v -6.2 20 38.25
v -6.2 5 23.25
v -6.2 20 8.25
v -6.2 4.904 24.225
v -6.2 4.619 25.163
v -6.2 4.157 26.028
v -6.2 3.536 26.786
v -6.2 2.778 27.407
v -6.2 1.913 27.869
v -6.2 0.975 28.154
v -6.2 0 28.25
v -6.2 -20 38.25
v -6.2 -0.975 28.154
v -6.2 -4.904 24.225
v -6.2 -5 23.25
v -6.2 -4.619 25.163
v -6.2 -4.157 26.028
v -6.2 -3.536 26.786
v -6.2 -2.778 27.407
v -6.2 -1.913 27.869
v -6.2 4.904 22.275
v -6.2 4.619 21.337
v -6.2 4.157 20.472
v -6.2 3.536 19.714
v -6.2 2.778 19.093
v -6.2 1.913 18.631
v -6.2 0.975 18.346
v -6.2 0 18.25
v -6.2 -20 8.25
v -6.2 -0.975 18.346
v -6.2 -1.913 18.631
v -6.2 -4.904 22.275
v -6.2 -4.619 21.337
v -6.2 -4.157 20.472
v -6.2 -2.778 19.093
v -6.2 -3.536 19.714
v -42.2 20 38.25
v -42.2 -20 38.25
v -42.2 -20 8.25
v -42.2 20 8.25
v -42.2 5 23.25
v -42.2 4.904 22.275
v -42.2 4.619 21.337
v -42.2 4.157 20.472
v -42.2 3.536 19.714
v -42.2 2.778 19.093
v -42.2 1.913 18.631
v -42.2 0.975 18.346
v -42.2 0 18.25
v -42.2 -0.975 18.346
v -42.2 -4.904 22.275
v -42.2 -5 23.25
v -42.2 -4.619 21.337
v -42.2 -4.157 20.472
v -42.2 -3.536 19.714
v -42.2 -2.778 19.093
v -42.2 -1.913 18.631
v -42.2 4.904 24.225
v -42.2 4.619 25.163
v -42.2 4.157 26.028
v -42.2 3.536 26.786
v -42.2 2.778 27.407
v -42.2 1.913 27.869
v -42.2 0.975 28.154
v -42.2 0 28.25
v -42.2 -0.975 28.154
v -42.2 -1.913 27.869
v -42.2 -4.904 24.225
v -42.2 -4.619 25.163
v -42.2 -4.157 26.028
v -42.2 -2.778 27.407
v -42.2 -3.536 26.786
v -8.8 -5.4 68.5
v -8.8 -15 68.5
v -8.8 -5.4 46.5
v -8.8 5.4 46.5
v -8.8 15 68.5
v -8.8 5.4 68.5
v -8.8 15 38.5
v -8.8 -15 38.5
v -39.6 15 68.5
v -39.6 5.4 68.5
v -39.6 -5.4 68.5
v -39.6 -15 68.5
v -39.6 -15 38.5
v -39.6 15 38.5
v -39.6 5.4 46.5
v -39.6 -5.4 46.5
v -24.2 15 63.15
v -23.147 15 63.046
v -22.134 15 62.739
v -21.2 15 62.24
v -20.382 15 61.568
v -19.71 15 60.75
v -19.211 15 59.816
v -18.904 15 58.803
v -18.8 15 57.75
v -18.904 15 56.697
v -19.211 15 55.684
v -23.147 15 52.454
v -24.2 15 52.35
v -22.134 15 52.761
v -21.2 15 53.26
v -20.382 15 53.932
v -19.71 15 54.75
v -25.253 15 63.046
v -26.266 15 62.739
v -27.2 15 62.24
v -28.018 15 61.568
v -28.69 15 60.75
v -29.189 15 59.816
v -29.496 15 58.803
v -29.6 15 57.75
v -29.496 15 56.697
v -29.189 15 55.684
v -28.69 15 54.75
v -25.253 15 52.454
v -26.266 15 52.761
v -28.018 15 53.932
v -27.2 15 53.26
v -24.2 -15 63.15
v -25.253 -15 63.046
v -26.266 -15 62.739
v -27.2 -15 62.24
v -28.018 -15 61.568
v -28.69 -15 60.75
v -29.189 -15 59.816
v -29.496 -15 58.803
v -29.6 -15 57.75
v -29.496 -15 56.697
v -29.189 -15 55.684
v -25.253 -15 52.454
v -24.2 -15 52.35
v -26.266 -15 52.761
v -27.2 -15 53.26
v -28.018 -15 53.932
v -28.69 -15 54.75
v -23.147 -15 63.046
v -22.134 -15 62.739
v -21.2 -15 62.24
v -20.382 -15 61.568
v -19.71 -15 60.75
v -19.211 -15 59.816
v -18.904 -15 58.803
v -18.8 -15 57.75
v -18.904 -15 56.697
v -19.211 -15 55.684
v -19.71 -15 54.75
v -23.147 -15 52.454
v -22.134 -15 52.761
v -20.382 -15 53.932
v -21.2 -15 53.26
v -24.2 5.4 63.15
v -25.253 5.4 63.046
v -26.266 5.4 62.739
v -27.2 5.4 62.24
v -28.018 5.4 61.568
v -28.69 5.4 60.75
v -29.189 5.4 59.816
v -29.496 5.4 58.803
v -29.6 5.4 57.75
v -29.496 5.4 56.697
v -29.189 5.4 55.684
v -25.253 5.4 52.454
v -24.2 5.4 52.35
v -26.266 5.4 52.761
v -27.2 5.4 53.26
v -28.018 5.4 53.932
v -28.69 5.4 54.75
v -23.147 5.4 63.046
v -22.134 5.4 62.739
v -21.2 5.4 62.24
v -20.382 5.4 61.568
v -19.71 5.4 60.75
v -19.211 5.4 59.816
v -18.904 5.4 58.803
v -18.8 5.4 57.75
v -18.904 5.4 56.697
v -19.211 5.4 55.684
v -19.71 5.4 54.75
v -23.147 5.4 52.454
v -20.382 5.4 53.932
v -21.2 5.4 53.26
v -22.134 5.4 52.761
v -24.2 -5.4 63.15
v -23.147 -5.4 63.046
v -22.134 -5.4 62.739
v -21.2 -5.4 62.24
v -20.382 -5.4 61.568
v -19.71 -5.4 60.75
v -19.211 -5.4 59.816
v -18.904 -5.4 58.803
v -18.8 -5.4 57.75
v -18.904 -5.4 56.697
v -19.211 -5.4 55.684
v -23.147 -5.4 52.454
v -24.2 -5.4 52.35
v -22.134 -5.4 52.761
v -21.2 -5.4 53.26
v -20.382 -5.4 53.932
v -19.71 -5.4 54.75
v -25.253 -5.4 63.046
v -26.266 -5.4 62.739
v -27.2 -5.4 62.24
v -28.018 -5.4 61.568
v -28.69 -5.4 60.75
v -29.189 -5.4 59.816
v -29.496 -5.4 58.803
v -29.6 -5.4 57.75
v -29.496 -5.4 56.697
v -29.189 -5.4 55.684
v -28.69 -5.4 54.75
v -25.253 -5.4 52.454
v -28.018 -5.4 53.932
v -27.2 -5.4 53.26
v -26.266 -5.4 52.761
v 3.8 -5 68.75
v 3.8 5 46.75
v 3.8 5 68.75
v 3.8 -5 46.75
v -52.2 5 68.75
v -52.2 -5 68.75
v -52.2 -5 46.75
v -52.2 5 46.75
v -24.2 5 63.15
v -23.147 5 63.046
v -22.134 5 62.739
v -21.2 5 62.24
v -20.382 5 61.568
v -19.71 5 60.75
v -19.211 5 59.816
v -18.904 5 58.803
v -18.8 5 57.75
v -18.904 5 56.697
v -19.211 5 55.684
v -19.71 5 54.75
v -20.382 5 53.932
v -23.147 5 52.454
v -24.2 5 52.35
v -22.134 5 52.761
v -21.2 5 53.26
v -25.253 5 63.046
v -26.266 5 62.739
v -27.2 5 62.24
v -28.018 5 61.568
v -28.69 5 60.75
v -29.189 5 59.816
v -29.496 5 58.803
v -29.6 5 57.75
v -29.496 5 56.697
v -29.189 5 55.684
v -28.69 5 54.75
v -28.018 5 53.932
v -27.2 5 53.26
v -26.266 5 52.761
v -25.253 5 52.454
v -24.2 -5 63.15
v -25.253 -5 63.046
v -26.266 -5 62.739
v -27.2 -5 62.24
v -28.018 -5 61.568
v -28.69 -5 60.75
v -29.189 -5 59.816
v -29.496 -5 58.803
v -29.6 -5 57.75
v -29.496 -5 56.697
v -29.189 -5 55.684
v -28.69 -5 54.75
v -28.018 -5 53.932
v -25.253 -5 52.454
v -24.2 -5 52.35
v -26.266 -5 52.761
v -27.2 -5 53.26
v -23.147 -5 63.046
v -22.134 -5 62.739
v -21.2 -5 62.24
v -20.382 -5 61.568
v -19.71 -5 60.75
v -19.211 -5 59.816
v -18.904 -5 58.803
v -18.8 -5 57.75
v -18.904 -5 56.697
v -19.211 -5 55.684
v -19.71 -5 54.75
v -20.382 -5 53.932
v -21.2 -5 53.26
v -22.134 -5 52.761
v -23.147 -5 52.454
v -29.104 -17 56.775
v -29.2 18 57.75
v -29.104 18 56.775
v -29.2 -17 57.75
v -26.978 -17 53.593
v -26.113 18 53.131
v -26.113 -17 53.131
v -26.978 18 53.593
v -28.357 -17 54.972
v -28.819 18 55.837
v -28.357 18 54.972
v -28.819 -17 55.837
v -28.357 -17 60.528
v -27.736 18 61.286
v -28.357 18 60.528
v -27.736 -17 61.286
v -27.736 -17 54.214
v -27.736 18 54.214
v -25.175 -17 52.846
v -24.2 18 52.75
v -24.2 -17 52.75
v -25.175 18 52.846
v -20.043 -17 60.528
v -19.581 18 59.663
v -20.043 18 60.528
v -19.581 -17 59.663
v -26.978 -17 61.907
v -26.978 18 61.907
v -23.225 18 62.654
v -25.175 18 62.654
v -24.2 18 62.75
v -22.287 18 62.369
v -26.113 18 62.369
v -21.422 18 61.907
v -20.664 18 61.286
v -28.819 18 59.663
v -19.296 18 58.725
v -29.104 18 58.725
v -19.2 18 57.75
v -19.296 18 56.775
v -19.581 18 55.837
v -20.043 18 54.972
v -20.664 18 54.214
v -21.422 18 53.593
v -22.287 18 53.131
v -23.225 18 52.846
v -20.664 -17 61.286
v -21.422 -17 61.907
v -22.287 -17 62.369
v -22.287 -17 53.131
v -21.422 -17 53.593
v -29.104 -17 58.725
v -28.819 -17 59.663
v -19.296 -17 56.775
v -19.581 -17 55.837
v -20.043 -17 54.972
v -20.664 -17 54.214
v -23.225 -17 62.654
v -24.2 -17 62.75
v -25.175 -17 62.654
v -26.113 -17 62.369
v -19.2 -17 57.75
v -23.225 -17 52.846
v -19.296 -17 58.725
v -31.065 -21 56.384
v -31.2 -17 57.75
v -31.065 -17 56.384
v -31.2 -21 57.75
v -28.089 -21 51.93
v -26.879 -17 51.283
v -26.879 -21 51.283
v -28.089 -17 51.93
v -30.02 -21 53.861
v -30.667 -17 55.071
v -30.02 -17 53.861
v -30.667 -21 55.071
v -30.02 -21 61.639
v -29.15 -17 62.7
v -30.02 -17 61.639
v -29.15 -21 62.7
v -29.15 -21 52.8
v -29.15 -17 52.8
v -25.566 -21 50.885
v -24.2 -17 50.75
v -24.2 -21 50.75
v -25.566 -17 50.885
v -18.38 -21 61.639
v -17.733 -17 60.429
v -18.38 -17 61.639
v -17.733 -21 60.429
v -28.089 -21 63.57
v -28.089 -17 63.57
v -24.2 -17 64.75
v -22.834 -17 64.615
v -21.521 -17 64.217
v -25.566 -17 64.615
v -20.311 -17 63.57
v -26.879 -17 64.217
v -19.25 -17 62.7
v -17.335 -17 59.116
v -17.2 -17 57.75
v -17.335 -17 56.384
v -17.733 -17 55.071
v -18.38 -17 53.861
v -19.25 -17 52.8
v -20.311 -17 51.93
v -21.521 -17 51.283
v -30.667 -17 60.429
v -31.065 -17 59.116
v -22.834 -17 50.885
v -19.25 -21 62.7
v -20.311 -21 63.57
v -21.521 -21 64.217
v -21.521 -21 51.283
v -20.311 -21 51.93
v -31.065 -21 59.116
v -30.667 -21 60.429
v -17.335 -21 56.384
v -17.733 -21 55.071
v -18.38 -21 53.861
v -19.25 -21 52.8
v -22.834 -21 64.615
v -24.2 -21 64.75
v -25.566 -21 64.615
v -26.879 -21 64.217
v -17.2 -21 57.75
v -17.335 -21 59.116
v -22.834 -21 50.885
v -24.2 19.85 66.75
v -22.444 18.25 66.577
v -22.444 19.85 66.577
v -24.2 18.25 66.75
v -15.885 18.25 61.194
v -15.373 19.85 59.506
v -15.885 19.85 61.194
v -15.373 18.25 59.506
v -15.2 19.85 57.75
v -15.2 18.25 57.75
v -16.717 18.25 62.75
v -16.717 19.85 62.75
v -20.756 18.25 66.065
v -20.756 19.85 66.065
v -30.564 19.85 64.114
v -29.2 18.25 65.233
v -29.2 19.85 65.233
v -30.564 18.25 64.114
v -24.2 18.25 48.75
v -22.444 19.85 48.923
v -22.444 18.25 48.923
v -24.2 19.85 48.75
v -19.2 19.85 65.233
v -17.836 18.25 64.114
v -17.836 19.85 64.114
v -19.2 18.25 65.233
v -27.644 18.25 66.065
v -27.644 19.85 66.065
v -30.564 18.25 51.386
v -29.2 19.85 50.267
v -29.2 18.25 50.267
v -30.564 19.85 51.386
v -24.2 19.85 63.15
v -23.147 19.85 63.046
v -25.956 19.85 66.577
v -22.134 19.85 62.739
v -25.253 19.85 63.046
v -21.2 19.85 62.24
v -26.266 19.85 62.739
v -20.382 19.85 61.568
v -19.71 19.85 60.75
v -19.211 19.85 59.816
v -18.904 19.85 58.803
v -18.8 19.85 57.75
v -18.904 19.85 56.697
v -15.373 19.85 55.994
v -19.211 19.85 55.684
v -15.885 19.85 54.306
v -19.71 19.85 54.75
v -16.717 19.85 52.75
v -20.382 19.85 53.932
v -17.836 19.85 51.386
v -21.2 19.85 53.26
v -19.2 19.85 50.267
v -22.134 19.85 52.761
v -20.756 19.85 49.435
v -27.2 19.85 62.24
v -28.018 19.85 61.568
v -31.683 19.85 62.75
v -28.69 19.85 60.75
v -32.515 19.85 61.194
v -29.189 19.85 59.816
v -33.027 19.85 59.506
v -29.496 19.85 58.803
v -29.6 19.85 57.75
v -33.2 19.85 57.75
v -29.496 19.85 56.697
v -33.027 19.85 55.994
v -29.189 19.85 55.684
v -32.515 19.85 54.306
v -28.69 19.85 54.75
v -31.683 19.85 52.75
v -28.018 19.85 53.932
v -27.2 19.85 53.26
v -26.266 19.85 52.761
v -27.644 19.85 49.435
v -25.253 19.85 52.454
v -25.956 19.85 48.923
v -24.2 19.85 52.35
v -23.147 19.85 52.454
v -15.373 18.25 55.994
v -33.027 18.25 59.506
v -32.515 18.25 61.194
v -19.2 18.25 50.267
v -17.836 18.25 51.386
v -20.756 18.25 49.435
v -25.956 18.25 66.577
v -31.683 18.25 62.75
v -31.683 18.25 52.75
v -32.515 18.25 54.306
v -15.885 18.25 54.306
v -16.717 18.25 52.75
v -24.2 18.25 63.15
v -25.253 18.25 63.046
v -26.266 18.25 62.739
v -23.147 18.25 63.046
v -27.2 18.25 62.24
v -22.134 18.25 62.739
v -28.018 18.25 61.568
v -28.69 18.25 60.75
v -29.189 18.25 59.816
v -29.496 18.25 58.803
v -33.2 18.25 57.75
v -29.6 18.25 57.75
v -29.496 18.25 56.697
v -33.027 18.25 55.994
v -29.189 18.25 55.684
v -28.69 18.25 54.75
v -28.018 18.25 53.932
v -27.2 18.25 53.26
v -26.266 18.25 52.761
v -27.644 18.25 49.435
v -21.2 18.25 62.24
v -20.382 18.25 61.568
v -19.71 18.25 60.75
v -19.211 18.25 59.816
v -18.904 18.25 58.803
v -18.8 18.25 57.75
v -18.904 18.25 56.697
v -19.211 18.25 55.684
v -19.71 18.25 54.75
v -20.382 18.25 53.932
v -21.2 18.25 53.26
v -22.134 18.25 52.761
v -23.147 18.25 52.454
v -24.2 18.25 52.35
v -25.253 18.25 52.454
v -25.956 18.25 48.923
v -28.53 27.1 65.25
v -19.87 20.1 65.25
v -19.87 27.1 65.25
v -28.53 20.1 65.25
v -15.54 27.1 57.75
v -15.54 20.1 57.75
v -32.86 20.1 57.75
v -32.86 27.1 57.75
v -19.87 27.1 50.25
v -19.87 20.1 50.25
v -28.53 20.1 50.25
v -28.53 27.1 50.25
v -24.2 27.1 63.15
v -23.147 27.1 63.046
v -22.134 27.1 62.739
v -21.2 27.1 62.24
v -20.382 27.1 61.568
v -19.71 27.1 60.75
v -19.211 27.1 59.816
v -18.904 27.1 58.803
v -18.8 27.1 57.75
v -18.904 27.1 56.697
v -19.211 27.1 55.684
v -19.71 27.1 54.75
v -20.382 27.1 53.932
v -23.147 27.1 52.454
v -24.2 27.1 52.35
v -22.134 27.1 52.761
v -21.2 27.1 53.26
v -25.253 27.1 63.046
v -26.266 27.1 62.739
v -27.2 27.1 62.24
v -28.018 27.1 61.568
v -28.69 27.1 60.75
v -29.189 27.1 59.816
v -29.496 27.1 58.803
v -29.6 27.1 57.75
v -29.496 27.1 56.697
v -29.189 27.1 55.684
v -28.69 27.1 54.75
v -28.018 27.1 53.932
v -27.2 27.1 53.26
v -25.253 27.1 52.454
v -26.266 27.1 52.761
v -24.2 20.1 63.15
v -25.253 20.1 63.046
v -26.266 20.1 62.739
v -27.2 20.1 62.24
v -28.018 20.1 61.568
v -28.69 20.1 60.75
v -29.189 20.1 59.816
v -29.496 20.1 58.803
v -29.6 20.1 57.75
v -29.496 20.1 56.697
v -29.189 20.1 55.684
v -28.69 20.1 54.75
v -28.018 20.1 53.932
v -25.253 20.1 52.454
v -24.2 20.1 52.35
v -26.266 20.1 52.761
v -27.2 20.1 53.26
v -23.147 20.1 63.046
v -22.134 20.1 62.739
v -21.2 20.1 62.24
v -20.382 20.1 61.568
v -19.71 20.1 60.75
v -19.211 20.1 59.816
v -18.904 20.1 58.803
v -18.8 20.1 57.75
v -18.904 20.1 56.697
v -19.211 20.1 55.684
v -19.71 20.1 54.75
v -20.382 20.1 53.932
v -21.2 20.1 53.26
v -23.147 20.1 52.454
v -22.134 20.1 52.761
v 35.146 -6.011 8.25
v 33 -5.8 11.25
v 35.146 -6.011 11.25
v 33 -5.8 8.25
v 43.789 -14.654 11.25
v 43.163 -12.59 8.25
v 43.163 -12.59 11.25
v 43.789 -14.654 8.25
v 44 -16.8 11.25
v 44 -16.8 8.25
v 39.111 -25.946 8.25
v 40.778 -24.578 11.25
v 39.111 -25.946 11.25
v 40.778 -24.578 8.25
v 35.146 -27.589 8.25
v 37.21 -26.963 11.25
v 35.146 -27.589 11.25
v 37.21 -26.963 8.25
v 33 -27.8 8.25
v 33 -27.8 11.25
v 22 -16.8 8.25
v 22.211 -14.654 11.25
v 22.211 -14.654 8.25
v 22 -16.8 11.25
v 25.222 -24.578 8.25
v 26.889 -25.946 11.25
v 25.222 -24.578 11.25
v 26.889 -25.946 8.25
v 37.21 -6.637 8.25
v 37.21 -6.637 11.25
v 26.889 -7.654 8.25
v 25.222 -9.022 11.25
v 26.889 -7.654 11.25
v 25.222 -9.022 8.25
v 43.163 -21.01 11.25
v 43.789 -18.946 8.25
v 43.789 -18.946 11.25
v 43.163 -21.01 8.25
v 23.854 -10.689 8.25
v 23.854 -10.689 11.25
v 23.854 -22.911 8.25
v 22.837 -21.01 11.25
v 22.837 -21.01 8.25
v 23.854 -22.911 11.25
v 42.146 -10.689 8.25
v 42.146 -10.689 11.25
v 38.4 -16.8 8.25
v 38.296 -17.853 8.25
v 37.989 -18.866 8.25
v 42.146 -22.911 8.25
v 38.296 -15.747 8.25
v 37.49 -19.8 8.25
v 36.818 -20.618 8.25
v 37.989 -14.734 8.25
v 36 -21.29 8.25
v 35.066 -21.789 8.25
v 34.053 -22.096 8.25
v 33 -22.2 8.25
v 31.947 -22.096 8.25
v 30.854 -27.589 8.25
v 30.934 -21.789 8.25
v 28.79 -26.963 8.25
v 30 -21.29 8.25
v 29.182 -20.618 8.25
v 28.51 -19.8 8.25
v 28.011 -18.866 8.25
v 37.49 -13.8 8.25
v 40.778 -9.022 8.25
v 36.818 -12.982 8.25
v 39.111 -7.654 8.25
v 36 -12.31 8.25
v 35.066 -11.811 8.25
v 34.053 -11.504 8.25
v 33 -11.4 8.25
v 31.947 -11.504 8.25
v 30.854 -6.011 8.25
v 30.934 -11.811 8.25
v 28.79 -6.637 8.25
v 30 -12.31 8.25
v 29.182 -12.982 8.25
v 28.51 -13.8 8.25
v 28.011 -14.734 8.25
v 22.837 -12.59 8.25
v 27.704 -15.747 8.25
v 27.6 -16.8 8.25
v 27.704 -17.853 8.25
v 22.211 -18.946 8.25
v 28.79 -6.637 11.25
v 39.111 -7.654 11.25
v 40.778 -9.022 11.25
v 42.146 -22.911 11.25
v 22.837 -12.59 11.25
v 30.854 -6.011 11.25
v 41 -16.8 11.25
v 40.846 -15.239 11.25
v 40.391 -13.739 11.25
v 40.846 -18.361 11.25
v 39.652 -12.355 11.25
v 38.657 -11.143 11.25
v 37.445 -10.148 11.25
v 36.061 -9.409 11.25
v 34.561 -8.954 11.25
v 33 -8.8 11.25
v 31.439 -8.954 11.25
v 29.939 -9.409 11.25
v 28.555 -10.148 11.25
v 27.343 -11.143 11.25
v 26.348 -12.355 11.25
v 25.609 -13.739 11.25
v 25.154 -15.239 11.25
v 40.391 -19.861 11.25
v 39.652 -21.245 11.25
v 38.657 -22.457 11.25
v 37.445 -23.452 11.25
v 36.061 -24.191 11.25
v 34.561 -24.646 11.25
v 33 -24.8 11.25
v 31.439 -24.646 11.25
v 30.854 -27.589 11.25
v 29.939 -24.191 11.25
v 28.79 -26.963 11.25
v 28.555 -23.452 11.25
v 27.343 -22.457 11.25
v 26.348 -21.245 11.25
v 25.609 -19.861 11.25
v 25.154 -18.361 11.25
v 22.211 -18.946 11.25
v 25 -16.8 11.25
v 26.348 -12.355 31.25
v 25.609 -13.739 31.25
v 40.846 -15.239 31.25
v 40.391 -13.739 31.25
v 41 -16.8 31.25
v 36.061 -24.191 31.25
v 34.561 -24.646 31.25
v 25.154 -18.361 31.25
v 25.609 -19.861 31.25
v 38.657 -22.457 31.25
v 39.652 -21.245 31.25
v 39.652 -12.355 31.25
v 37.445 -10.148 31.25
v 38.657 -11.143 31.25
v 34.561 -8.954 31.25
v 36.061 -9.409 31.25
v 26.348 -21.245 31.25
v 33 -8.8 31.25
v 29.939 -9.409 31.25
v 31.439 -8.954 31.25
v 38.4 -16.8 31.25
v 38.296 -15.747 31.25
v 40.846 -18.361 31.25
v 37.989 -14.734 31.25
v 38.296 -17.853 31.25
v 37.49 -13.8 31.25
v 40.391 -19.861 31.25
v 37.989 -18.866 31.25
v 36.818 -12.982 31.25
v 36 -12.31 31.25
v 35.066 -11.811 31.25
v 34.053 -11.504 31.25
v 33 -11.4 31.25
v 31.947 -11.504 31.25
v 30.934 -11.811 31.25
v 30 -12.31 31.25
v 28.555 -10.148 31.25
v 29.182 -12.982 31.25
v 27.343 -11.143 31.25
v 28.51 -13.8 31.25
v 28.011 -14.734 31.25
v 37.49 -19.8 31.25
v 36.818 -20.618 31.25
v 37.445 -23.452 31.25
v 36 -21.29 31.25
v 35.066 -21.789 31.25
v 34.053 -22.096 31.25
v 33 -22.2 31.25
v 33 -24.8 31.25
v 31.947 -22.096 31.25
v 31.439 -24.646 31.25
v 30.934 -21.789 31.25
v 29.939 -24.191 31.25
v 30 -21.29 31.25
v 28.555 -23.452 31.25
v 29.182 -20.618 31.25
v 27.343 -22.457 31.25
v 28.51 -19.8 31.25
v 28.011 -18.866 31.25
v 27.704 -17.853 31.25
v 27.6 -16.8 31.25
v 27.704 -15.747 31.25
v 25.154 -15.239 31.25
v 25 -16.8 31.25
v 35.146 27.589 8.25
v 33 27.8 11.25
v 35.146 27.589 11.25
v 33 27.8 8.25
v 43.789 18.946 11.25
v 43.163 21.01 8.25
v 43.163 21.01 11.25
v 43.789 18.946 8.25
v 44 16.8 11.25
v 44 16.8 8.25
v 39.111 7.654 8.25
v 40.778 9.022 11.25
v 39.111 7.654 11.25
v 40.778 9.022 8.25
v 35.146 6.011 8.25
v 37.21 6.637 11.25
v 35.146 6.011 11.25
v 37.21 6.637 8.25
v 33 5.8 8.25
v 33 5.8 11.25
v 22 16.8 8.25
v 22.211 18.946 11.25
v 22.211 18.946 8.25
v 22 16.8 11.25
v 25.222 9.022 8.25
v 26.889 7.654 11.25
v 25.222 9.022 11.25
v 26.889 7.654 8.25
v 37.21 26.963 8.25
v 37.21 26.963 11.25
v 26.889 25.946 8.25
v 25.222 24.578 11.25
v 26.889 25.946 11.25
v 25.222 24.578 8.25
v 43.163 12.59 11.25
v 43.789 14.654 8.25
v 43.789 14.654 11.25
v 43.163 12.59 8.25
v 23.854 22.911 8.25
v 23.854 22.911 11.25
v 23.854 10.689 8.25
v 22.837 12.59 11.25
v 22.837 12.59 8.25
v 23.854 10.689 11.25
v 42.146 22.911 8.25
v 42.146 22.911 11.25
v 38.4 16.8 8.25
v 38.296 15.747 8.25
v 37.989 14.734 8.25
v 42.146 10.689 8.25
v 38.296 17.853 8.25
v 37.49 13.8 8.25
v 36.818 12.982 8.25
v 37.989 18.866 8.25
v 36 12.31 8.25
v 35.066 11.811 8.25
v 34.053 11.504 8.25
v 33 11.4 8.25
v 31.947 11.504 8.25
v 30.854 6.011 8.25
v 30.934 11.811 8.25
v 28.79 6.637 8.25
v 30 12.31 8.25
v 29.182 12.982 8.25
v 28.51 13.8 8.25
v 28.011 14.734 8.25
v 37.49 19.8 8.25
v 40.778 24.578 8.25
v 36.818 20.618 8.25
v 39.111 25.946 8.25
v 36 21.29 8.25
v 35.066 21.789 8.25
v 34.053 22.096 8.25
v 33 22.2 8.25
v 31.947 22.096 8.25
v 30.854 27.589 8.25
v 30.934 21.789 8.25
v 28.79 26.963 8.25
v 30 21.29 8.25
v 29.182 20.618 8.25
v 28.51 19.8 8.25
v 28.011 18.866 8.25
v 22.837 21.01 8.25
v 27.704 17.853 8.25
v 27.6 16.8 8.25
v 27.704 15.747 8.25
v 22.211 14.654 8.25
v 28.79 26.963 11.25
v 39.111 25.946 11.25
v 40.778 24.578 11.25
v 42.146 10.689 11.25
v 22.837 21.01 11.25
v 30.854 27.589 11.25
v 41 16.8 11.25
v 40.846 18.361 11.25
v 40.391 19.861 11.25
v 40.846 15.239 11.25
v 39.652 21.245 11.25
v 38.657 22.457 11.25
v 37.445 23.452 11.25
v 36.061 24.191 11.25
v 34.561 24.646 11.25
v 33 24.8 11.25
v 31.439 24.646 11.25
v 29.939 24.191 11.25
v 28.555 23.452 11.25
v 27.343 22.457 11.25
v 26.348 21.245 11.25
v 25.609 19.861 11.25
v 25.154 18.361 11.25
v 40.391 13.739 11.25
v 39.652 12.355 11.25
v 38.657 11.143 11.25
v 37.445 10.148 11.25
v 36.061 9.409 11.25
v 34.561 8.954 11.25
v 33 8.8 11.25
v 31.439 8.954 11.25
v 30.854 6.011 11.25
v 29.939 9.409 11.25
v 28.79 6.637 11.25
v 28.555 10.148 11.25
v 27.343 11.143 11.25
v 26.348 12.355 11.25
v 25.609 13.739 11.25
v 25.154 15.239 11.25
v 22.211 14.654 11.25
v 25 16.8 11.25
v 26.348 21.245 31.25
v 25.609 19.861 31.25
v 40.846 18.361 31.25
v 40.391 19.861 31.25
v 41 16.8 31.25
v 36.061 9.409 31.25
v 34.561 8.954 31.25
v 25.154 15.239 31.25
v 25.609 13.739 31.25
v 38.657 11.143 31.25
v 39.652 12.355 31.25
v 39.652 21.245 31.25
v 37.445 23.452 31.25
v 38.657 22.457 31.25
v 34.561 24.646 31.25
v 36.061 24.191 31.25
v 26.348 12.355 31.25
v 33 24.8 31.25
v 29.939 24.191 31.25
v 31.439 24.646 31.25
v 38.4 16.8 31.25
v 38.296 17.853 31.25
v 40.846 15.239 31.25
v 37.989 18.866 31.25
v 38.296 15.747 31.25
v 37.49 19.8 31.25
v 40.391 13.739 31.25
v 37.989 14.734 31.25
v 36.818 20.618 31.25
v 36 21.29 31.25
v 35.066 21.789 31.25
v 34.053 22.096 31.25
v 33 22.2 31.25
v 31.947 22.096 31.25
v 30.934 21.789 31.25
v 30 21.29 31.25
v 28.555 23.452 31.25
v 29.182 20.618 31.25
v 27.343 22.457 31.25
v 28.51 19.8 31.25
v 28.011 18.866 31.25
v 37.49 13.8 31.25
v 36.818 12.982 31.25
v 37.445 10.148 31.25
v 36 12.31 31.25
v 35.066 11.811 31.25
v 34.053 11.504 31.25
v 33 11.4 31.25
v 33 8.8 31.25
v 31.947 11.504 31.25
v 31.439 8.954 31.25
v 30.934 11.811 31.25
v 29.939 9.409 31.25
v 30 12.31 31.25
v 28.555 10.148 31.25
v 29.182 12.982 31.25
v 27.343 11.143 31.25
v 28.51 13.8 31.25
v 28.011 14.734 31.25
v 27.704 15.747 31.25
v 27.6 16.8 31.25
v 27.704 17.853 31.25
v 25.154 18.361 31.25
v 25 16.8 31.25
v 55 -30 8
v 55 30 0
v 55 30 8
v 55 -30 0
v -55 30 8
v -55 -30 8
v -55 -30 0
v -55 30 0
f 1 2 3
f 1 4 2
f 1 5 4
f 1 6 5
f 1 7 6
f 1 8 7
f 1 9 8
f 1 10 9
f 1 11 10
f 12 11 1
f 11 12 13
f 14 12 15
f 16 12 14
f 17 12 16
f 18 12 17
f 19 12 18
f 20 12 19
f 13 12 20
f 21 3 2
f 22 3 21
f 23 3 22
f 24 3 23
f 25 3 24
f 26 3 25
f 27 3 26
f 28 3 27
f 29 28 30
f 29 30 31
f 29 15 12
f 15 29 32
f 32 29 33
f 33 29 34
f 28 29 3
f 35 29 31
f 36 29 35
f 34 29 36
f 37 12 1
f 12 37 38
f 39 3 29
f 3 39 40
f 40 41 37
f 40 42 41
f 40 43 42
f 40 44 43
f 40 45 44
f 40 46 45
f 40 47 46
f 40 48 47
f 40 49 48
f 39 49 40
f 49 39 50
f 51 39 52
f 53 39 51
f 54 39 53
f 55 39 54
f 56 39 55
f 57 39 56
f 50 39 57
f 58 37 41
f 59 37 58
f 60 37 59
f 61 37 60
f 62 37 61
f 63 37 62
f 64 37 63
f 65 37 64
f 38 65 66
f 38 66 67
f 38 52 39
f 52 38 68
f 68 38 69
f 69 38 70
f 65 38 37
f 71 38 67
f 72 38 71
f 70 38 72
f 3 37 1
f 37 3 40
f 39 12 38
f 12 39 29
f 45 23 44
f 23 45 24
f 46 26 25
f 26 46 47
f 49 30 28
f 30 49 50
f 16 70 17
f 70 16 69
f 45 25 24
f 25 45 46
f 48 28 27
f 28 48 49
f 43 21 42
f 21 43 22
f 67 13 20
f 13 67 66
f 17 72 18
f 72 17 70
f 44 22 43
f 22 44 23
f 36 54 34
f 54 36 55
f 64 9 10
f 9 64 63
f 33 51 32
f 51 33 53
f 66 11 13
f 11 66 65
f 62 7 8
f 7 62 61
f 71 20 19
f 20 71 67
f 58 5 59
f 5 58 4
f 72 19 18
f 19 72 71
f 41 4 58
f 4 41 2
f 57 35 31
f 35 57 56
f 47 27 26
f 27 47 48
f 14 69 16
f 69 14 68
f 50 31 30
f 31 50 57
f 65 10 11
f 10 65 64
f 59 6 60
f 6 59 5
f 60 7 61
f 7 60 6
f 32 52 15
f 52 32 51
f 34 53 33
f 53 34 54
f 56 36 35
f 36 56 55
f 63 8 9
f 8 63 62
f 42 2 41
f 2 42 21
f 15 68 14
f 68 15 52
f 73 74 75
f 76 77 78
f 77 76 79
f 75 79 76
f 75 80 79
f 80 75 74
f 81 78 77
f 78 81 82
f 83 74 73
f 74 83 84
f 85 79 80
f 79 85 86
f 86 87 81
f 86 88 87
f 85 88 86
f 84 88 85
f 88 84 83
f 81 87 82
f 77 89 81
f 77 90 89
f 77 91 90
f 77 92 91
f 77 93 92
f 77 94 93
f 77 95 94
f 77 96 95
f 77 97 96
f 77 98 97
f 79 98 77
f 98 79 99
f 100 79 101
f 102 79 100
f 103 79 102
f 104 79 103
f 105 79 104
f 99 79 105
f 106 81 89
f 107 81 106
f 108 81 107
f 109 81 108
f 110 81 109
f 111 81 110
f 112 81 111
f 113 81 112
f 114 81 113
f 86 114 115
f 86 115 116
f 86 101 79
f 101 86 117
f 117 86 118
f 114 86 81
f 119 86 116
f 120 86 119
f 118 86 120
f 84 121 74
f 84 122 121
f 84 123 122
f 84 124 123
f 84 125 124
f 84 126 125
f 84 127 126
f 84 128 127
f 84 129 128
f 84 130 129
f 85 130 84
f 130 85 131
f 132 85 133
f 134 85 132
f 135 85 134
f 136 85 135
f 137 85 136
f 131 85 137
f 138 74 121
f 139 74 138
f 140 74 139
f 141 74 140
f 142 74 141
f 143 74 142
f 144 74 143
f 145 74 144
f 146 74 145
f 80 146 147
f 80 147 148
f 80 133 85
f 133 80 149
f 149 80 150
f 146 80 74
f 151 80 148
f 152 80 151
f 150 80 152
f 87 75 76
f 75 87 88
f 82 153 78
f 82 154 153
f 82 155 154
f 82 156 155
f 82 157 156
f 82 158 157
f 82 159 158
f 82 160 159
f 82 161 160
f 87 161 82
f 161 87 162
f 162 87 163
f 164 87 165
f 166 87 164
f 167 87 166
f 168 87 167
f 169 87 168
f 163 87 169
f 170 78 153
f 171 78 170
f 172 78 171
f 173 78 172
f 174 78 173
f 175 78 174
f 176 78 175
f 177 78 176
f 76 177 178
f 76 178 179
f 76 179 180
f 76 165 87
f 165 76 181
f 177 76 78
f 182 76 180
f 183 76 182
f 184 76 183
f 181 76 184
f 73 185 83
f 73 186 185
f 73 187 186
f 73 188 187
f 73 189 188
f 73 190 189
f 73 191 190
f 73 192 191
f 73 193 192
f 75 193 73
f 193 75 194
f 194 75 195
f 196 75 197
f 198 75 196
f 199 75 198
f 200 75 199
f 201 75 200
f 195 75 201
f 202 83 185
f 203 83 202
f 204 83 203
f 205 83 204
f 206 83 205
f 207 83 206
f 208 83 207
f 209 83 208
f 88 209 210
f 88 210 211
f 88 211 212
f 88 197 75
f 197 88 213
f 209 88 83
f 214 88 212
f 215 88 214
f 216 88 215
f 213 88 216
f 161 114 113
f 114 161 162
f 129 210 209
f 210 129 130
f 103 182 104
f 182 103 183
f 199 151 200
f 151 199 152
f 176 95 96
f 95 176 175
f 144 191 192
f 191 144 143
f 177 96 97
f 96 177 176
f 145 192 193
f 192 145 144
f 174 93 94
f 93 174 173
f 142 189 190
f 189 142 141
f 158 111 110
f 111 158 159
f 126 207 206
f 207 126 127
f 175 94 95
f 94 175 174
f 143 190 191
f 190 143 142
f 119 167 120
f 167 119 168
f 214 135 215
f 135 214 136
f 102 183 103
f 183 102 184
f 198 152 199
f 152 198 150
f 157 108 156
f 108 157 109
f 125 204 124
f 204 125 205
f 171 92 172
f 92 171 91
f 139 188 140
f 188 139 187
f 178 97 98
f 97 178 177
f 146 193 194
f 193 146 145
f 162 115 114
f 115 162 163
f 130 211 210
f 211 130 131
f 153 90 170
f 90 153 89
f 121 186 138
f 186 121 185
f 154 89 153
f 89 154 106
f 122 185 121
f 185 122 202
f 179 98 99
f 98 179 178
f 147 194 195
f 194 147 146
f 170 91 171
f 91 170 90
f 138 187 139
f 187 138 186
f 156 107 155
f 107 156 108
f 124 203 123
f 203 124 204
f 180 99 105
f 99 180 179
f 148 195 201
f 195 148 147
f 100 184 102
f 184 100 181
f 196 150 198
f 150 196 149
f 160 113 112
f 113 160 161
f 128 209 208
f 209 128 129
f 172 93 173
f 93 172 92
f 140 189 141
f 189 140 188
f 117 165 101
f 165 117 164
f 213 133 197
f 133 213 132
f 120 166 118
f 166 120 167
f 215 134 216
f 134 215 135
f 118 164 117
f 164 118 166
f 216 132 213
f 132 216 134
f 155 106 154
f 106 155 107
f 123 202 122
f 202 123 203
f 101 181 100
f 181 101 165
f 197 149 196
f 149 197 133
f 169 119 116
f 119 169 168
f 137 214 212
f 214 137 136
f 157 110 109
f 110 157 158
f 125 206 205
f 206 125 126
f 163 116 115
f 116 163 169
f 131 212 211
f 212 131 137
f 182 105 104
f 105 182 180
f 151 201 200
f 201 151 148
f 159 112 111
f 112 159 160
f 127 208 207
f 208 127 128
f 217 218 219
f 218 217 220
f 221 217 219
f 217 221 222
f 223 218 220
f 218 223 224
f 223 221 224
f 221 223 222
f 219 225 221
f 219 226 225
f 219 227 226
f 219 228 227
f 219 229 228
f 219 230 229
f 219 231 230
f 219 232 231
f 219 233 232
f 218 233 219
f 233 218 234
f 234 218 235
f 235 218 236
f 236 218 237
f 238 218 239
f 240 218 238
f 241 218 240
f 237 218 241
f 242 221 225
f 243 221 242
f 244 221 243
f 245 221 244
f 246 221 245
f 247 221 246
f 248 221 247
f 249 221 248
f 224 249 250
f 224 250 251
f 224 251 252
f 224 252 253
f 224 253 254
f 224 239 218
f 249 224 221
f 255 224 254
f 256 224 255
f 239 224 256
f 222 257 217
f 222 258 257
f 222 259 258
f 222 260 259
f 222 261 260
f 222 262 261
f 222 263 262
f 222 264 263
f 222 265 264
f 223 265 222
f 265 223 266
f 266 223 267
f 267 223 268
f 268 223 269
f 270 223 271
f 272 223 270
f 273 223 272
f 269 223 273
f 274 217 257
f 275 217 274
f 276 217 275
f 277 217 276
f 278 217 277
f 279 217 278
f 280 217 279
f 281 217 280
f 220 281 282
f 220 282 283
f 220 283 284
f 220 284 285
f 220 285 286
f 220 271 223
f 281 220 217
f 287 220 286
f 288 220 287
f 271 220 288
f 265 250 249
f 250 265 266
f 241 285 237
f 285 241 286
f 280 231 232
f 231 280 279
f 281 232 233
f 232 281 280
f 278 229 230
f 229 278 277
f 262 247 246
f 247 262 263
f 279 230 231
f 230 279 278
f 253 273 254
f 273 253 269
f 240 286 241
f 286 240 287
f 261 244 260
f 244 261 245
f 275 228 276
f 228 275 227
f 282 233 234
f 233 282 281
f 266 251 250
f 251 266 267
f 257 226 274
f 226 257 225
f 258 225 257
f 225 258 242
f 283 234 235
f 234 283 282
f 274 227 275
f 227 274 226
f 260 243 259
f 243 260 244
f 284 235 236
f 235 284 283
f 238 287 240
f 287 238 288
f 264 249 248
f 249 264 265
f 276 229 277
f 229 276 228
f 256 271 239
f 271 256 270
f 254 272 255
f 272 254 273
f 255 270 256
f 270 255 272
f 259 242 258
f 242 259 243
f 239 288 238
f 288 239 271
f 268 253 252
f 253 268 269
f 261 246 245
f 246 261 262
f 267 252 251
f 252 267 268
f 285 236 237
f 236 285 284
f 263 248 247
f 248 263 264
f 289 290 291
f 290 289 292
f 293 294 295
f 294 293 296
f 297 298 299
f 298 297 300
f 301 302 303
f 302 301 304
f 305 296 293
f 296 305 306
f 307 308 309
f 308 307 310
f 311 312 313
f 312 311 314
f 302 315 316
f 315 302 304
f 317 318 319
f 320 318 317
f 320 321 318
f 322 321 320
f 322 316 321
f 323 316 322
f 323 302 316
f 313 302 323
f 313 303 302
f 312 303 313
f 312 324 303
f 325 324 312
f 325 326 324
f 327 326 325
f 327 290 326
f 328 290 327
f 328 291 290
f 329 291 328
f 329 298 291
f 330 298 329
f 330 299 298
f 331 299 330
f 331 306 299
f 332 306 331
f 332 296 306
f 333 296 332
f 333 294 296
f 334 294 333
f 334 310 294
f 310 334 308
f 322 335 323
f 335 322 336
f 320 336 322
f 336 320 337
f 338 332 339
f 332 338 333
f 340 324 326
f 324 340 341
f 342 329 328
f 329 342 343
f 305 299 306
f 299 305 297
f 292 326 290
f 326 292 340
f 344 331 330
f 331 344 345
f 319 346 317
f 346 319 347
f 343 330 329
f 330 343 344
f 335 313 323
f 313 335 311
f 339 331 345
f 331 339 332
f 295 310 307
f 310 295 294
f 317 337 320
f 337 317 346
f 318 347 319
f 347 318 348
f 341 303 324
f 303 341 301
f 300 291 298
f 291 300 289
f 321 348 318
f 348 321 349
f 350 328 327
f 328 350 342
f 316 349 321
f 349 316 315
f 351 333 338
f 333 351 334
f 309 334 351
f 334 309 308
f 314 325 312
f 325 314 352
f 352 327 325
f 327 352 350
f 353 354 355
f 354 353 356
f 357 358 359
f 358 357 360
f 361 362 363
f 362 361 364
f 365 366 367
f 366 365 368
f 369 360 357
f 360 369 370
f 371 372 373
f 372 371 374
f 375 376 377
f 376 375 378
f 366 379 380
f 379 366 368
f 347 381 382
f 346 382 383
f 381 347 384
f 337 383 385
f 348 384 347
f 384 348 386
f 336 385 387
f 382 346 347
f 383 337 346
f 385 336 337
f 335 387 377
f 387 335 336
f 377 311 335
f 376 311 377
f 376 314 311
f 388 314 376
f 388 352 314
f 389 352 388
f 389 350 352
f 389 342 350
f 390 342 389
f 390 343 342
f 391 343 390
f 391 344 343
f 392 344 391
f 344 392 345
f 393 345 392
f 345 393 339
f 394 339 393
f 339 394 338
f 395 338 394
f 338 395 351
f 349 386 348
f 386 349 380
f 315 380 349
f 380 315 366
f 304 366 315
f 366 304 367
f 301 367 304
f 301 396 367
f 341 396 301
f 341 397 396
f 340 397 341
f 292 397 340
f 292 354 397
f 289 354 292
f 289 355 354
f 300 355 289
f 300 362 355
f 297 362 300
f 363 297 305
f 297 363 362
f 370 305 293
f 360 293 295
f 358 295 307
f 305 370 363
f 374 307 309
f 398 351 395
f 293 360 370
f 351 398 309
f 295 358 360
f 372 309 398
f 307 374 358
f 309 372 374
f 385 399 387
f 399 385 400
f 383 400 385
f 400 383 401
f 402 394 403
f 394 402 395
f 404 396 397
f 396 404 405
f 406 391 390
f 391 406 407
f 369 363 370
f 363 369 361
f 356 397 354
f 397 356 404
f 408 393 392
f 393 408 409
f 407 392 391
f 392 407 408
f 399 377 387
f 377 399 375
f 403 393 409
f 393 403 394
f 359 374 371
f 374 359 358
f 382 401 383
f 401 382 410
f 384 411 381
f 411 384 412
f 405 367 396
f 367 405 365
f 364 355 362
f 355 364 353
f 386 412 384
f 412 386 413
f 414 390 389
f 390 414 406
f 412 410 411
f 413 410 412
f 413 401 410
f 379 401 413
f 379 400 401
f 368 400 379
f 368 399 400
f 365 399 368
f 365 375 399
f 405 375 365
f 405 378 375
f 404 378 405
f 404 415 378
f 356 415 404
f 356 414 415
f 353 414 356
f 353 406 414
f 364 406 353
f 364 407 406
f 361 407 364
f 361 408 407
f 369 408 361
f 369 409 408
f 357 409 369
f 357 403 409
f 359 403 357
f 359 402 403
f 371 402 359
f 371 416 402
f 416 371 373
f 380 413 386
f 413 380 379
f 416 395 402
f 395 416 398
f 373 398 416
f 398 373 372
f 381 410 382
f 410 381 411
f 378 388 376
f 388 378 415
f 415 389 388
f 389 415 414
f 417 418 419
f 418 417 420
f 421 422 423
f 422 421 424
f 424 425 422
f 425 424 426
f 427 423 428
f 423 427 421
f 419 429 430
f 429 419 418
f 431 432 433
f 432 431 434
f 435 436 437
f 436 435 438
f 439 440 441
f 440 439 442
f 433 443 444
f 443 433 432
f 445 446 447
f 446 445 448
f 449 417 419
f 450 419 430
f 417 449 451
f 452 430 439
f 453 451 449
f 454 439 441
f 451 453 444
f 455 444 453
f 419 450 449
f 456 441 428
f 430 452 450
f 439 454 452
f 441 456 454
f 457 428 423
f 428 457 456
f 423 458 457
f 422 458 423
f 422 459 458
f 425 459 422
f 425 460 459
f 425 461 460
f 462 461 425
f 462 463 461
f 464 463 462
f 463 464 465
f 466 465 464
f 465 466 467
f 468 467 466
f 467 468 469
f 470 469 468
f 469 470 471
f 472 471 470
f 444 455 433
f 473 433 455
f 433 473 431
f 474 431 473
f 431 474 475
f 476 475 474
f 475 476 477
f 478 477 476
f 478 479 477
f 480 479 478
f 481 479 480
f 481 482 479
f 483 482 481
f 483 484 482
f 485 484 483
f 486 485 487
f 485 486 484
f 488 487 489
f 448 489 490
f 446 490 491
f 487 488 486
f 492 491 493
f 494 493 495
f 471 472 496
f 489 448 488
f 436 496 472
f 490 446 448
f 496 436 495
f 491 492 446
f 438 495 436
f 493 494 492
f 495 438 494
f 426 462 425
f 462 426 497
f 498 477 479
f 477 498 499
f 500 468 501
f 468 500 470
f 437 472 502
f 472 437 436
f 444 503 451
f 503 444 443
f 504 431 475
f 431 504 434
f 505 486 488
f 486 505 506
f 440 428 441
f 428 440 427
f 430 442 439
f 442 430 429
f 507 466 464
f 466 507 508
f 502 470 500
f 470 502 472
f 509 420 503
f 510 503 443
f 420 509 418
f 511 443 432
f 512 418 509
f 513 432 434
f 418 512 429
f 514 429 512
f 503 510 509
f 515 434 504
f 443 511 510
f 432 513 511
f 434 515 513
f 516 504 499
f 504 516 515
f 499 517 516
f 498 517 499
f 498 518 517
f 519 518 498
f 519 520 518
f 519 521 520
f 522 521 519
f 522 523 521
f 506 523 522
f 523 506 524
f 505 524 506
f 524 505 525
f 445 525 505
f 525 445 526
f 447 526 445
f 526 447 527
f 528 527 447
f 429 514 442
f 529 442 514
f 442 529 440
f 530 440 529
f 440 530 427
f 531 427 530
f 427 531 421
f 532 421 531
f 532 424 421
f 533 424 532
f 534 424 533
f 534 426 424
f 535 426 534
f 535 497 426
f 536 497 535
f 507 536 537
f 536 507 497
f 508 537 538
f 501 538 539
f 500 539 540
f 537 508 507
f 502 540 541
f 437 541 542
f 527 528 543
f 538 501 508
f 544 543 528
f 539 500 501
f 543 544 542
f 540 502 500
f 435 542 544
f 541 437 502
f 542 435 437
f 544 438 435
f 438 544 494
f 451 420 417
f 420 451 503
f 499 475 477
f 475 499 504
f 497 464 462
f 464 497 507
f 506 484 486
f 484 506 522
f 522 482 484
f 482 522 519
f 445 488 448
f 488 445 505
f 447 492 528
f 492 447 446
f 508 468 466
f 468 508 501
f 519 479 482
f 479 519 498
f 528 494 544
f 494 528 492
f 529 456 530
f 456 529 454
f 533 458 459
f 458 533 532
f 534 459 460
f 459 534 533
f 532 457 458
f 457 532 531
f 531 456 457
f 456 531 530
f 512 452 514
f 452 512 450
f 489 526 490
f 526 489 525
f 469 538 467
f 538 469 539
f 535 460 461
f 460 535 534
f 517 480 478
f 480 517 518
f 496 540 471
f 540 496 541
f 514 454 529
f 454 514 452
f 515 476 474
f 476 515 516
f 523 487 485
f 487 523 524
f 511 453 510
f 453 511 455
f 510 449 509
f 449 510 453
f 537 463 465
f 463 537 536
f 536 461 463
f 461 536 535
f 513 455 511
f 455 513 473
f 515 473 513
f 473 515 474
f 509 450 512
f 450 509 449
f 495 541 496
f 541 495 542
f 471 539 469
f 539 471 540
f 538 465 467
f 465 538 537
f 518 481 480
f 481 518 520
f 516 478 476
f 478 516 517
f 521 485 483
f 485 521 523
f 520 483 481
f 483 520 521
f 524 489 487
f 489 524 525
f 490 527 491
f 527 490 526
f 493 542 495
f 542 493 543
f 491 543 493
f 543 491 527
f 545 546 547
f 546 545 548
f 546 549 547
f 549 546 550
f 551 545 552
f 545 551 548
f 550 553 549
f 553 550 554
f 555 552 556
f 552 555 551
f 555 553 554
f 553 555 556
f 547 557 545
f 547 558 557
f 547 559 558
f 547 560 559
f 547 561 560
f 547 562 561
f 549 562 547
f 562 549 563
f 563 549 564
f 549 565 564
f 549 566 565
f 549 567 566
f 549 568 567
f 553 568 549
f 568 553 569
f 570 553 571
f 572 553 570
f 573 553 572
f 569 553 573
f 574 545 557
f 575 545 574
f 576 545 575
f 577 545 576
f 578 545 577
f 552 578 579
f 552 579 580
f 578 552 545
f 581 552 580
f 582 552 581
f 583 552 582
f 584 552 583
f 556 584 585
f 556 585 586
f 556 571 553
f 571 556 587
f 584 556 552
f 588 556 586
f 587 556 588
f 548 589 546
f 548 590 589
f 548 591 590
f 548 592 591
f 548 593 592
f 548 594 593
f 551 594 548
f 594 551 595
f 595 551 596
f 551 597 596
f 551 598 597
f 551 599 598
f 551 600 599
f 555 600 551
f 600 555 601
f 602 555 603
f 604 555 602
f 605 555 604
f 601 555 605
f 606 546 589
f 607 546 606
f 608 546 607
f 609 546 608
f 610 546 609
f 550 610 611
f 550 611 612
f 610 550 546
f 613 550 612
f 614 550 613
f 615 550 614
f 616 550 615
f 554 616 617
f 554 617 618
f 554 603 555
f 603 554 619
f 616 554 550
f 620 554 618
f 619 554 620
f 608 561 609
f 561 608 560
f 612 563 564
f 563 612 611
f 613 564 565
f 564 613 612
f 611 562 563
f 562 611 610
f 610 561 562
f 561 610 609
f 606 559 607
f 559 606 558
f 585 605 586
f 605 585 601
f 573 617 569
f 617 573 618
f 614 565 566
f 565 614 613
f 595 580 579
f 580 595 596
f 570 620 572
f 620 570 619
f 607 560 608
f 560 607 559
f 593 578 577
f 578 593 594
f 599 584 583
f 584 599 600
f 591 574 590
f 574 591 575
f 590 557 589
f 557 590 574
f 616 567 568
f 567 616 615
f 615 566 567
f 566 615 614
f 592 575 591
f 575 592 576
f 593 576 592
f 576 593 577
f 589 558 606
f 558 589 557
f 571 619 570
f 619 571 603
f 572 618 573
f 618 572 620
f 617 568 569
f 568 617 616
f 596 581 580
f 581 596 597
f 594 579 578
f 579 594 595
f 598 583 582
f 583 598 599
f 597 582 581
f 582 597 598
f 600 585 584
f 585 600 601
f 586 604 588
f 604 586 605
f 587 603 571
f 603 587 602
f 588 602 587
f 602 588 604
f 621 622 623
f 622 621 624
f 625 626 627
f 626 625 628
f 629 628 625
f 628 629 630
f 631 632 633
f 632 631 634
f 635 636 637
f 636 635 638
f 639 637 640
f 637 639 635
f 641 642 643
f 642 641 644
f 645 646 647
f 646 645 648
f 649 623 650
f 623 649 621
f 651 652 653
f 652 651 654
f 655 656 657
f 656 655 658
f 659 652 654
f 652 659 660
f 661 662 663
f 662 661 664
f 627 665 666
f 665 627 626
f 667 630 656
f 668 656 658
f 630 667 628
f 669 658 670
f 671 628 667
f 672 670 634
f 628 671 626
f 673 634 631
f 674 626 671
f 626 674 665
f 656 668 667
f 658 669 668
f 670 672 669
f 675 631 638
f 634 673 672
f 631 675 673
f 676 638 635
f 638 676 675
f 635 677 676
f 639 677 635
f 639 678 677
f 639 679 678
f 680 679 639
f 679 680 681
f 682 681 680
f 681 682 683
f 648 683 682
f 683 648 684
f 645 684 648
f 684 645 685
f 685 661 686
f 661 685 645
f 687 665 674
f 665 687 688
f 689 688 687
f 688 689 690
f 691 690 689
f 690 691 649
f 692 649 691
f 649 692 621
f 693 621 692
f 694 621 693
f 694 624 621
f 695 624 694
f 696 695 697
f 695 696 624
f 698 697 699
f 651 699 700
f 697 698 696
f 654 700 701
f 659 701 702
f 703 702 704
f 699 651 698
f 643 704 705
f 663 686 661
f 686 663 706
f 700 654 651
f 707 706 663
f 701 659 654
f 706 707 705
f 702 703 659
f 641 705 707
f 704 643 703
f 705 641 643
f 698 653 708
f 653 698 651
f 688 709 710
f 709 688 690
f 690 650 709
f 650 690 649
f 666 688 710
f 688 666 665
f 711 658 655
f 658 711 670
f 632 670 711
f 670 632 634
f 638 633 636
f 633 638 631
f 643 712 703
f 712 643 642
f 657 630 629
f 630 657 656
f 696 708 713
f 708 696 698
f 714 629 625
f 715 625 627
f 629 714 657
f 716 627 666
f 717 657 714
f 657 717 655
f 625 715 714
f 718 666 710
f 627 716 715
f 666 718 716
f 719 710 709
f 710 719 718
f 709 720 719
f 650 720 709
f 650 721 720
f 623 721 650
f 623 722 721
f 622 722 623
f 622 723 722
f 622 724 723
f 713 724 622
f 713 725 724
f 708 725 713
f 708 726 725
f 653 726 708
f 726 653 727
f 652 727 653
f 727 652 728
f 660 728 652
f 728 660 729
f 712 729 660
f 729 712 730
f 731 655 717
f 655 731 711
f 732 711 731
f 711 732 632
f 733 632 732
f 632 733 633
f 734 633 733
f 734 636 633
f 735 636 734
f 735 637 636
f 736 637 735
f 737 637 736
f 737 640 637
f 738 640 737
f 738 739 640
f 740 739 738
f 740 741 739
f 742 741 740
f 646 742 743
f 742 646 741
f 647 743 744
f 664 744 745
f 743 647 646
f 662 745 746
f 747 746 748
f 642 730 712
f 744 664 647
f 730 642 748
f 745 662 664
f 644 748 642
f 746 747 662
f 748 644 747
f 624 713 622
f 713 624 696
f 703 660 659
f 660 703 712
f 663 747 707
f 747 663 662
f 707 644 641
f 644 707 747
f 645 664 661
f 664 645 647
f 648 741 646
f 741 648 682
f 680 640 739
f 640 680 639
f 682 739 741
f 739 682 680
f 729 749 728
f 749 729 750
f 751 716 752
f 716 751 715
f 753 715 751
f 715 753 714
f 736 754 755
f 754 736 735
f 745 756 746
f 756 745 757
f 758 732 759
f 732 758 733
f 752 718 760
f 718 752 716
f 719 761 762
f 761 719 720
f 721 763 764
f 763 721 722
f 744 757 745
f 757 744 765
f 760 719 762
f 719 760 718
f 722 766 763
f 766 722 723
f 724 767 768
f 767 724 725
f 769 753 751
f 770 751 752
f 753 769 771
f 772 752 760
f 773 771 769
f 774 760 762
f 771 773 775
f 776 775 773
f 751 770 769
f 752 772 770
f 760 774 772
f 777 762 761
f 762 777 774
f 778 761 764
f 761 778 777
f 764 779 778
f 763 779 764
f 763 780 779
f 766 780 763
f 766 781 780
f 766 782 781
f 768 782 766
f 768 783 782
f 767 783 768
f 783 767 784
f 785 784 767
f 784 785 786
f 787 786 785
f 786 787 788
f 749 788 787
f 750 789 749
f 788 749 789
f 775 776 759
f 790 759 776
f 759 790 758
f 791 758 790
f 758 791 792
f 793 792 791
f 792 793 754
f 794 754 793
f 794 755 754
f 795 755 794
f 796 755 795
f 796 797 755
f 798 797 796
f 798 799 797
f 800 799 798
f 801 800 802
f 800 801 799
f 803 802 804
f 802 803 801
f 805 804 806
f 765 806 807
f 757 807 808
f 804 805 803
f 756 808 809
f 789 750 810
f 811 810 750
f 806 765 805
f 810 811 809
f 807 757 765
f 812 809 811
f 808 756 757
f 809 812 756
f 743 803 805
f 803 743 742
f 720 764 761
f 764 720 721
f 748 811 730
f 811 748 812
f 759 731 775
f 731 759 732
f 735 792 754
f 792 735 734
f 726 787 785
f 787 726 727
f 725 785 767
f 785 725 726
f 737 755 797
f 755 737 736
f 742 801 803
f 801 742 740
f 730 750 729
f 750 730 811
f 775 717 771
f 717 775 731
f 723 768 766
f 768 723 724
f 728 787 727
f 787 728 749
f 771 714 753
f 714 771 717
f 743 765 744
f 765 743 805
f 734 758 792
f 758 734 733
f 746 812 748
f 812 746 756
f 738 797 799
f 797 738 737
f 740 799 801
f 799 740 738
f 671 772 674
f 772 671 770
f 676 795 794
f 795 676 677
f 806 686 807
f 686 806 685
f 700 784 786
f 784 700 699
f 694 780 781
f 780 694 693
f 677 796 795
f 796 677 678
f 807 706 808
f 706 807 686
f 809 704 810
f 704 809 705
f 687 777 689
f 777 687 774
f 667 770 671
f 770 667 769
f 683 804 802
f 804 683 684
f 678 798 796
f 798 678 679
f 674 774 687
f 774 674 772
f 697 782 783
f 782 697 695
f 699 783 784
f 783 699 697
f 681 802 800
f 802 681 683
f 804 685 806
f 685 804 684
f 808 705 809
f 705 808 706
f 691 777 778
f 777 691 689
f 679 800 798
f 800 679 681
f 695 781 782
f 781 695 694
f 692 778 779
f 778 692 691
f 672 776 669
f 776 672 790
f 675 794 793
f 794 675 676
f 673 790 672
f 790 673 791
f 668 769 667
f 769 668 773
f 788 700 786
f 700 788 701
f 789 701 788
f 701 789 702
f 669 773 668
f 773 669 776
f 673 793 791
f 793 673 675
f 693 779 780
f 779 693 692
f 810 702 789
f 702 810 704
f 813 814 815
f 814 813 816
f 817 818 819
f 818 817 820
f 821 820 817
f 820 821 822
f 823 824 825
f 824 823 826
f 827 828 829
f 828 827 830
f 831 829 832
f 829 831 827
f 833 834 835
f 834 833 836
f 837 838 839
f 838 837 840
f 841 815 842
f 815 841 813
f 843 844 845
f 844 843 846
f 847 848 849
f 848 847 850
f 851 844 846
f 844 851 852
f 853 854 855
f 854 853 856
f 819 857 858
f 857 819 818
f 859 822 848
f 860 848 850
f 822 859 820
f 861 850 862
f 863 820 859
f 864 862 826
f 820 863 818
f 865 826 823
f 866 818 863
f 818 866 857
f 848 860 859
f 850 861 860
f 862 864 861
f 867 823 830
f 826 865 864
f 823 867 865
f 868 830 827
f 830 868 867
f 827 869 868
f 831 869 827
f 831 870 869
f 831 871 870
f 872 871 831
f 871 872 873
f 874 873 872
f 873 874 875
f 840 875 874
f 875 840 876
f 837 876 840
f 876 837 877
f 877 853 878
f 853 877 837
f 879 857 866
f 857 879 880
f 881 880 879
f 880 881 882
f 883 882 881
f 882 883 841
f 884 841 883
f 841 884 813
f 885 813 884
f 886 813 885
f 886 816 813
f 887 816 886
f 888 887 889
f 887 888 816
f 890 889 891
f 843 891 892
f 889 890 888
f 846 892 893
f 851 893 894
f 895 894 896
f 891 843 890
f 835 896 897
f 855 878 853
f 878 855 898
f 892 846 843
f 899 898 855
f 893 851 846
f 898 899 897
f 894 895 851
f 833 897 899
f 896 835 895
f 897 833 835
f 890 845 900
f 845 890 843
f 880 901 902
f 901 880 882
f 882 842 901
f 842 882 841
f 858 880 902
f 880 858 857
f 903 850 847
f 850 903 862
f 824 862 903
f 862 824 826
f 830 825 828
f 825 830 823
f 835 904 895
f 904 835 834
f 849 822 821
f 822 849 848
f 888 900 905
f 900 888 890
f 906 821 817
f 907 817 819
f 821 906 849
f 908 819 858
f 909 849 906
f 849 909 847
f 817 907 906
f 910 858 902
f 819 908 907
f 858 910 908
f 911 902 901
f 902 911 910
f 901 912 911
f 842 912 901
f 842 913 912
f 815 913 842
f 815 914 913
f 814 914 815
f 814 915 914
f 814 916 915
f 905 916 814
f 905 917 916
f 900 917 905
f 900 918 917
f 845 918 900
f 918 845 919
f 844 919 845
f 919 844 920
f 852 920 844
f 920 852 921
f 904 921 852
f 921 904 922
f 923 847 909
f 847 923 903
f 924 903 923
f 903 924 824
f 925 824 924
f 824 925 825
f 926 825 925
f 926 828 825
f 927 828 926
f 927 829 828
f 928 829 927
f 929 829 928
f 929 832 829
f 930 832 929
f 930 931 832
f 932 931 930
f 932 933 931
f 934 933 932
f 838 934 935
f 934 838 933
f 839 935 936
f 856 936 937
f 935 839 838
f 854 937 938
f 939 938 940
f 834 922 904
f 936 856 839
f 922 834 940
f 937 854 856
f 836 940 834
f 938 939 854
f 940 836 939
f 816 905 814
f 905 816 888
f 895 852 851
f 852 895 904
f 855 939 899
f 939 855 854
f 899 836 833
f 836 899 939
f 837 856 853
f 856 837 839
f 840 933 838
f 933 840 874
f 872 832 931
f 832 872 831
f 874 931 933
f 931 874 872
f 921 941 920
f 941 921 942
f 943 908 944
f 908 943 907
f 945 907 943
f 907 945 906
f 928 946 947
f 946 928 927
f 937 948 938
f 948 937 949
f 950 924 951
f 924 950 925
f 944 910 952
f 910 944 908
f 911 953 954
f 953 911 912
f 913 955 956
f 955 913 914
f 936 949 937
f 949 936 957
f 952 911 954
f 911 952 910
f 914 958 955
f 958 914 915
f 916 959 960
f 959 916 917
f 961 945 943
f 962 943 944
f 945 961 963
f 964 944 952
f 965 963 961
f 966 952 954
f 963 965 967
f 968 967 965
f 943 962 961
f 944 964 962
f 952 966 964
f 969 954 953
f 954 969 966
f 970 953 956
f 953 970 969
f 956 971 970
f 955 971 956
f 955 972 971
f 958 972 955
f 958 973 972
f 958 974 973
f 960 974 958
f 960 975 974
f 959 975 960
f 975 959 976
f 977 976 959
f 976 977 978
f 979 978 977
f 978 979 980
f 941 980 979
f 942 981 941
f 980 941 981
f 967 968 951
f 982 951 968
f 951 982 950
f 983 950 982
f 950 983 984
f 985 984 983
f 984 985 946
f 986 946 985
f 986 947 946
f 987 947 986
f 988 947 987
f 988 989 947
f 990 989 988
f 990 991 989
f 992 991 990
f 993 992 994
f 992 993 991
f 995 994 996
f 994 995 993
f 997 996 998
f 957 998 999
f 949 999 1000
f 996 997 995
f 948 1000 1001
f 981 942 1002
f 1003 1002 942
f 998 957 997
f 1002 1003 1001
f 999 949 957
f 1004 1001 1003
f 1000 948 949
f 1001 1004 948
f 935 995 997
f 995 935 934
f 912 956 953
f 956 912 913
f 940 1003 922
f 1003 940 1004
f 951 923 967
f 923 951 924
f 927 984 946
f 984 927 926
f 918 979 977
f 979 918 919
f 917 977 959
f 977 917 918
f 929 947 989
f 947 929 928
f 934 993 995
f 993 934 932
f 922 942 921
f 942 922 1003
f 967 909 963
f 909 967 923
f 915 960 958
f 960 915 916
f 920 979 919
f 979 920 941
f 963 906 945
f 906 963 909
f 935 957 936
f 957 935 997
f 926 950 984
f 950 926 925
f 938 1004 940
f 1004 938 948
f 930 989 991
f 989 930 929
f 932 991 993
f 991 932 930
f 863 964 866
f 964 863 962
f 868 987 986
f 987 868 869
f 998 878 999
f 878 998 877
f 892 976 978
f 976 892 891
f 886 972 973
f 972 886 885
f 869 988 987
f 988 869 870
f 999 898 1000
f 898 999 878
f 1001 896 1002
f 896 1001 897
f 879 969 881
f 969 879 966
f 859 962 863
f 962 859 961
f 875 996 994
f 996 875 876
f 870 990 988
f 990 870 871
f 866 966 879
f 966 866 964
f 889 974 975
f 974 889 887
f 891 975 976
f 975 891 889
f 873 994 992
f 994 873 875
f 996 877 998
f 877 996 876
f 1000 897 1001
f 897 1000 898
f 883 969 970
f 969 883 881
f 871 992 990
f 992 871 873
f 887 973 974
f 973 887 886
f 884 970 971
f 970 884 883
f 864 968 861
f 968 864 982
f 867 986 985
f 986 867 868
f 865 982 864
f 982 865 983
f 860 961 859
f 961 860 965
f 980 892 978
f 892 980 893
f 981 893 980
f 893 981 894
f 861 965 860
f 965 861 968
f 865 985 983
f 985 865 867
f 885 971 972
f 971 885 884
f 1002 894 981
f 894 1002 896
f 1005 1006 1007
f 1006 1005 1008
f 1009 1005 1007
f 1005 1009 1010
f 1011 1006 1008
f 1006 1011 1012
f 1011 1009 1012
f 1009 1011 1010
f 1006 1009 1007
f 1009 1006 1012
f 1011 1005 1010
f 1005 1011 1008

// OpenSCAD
$fn = 32;

// ------------------------------------------------------------------------
// Indexing jig: plate 110 x 60 mm, pin d10
// Every part is its own module, assembly() places every instance.
// ------------------------------------------------------------------------

// --- part 1 ---
module jig_plate() {
  difference() {
    translate([-55, -30, 0]) cube([110, 60, 8]);
  }
}

// --- part 2 ---
module locator_block() {
  difference() {
    translate([-18, -20, 0]) cube([36, 40, 30]);
    translate([0, 0, 15]) rotate([0, 90, 0]) cylinder(h = 38, d = 10, center = true);
  }
}

// --- part 3 ---
module index_fork() {
  difference() {
    translate([-15.4, -15, 0]) cube([30.8, 30, 30]);
    translate([-16.4, -5.4, 8]) cube([32.8, 10.8, 23]);
    translate([0, 0, 19.25]) rotate([90, 0, 0]) cylinder(h = 32, d = 10.8, center = true);
  }
}

// --- part 4 ---
module index_arm() {
  difference() {
    translate([-28, -5, 0]) cube([56, 10, 22]);
    translate([0, 0, 11]) rotate([90, 0, 0]) cylinder(h = 12, d = 10.8, center = true);
  }
}

// --- part 5 ---
module index_pin() {
  rotate([0, 90, 0]) cylinder(h = 36, d = 10, center = true);
  translate([-21, 0, 0]) rotate([0, 90, 0]) cylinder(h = 4, d = 14);
}

// --- part 6 ---
module pin_washer() {
  difference() {
      translate([0, 0, 0]) cylinder(h = 1.6, d = 18);
      translate([0, 0, -1]) cylinder(h = 3.6, d = 10.8);
    }
}

// --- part 7 ---
module lock_nut() {
  difference() {
    linear_extrude(height = 7) polygon(points = [[8.66, 0], [4.33, 7.5], [-4.33, 7.5], [-8.66, 0], [-4.33, -7.5], [4.33, -7.5]]);
    translate([0, 0, -1]) cylinder(h = 9, d = 10.8);
  }
}

// --- part 8 ---
module guide_bush_a() {
  difference() {
    union() {
      cylinder(h = 3, d = 22);
      translate([0, 0, 3]) cylinder(h = 20, d = 16);
    }
    translate([0, 0, -1]) cylinder(h = 25, d = 10.8);
  }
}

// --- part 9 ---
module guide_bush_b() {
  difference() {
    union() {
      cylinder(h = 3, d = 22);
      translate([0, 0, 3]) cylinder(h = 20, d = 16);
    }
    translate([0, 0, -1]) cylinder(h = 25, d = 10.8);
  }
}

// --- assembly ---
module assembly() {
  color([0.80, 0.24, 0.20]) translate([0, 0, 0]) rotate([0, 0, 0]) jig_plate();
  color([0.20, 0.45, 0.75]) translate([-24.2, 0, 8.25]) rotate([0, 0, 0]) locator_block();
  color([0.25, 0.62, 0.32]) translate([-24.2, 0, 38.5]) rotate([0, 0, 0]) index_fork();
  color([0.92, 0.70, 0.18]) translate([-24.2, 0, 46.75]) rotate([0, 0, 0]) index_arm();
  color([0.58, 0.35, 0.70]) translate([-24.2, 0, 57.75]) rotate([0, 0, 90]) index_pin();
  color([0.16, 0.66, 0.66]) translate([-24.2, 19.85, 57.75]) rotate([90, 0, 0]) pin_washer();
  color([0.85, 0.48, 0.18]) translate([-24.2, 27.1, 57.75]) rotate([90, 0, 0]) lock_nut();
  color([0.55, 0.60, 0.65]) translate([33, -16.8, 8.25]) rotate([0, 0, 0]) guide_bush_a();
  color([0.75, 0.30, 0.55]) translate([33, 16.8, 8.25]) rotate([0, 0, 0]) guide_bush_b();
}

assembly();
